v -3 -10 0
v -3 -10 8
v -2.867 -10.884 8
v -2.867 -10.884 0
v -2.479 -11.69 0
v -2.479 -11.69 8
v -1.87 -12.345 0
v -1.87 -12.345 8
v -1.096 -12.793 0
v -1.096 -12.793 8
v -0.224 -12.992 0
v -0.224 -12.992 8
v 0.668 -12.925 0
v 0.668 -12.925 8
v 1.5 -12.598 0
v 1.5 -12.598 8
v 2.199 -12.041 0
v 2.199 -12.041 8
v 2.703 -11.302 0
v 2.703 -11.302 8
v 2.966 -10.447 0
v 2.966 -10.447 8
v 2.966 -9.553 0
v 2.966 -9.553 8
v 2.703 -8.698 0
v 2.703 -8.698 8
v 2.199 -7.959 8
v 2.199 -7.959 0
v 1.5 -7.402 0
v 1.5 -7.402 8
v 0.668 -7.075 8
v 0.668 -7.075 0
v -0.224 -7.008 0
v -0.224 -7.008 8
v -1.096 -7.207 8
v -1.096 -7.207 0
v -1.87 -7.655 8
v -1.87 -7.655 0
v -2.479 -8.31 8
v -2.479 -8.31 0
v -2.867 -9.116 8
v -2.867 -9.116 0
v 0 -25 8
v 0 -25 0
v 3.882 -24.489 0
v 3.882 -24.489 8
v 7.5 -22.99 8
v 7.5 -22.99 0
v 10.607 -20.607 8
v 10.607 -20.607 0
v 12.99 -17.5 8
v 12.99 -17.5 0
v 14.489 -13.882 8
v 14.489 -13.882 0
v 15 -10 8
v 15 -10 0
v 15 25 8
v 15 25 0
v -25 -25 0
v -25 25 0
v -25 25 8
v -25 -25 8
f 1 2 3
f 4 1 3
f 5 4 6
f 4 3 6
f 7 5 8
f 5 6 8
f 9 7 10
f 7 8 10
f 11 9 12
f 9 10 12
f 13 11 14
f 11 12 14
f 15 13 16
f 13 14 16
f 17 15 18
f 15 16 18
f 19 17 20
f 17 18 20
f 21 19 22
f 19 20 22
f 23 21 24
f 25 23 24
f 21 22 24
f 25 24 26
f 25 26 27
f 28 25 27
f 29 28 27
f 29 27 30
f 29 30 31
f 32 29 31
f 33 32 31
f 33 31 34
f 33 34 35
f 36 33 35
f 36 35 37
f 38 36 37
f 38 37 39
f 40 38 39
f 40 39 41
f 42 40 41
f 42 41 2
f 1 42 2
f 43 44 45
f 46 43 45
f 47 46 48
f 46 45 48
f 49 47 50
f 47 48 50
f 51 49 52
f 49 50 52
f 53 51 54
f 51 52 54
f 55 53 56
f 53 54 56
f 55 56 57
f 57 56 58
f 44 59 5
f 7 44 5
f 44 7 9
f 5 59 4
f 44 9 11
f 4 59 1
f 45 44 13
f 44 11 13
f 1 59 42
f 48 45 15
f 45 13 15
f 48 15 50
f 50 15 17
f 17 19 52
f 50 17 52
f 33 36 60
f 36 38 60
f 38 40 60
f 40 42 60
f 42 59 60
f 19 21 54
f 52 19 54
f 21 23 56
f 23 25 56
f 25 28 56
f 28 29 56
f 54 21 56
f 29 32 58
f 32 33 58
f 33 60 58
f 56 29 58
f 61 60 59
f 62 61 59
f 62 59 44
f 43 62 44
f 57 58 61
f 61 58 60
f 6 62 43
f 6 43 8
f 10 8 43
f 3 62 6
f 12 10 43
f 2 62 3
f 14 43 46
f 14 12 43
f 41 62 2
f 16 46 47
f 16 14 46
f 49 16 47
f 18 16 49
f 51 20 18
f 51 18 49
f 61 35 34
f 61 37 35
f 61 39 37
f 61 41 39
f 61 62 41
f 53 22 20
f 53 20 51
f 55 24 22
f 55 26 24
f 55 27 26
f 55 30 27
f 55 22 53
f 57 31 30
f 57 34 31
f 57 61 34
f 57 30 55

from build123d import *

# Parameters (mm, degrees)
F1_DEPTH = 8
F2_D     = 6


with BuildPart() as f1:
    # F0 (on Top) → F1 (new body)
    with BuildSketch(Plane.XY):
        with BuildLine():
            Line((15, -10), (15, 25))
            Line((15, 25), (-15, 25))
            Line((-15, 25), (-25, 25))
            Line((-25, 25), (-25, -25))
            Line((-25, -25), (-15, -25))
            Line((-15, -25), (0, -25))
            ThreePointArc((0, -25), (10.6066017178, -20.6066017178), (15, -10))
        make_face()
    extrude(amount=F1_DEPTH)

    # F2 (through all)
    with Locations(Plane(origin=(0, 0, 0), x_dir=(1, 0, 0), z_dir=(0, 0, -1))):
        with Locations((0, 10)):
            Hole(F2_D / 2)


solid = f1.part
